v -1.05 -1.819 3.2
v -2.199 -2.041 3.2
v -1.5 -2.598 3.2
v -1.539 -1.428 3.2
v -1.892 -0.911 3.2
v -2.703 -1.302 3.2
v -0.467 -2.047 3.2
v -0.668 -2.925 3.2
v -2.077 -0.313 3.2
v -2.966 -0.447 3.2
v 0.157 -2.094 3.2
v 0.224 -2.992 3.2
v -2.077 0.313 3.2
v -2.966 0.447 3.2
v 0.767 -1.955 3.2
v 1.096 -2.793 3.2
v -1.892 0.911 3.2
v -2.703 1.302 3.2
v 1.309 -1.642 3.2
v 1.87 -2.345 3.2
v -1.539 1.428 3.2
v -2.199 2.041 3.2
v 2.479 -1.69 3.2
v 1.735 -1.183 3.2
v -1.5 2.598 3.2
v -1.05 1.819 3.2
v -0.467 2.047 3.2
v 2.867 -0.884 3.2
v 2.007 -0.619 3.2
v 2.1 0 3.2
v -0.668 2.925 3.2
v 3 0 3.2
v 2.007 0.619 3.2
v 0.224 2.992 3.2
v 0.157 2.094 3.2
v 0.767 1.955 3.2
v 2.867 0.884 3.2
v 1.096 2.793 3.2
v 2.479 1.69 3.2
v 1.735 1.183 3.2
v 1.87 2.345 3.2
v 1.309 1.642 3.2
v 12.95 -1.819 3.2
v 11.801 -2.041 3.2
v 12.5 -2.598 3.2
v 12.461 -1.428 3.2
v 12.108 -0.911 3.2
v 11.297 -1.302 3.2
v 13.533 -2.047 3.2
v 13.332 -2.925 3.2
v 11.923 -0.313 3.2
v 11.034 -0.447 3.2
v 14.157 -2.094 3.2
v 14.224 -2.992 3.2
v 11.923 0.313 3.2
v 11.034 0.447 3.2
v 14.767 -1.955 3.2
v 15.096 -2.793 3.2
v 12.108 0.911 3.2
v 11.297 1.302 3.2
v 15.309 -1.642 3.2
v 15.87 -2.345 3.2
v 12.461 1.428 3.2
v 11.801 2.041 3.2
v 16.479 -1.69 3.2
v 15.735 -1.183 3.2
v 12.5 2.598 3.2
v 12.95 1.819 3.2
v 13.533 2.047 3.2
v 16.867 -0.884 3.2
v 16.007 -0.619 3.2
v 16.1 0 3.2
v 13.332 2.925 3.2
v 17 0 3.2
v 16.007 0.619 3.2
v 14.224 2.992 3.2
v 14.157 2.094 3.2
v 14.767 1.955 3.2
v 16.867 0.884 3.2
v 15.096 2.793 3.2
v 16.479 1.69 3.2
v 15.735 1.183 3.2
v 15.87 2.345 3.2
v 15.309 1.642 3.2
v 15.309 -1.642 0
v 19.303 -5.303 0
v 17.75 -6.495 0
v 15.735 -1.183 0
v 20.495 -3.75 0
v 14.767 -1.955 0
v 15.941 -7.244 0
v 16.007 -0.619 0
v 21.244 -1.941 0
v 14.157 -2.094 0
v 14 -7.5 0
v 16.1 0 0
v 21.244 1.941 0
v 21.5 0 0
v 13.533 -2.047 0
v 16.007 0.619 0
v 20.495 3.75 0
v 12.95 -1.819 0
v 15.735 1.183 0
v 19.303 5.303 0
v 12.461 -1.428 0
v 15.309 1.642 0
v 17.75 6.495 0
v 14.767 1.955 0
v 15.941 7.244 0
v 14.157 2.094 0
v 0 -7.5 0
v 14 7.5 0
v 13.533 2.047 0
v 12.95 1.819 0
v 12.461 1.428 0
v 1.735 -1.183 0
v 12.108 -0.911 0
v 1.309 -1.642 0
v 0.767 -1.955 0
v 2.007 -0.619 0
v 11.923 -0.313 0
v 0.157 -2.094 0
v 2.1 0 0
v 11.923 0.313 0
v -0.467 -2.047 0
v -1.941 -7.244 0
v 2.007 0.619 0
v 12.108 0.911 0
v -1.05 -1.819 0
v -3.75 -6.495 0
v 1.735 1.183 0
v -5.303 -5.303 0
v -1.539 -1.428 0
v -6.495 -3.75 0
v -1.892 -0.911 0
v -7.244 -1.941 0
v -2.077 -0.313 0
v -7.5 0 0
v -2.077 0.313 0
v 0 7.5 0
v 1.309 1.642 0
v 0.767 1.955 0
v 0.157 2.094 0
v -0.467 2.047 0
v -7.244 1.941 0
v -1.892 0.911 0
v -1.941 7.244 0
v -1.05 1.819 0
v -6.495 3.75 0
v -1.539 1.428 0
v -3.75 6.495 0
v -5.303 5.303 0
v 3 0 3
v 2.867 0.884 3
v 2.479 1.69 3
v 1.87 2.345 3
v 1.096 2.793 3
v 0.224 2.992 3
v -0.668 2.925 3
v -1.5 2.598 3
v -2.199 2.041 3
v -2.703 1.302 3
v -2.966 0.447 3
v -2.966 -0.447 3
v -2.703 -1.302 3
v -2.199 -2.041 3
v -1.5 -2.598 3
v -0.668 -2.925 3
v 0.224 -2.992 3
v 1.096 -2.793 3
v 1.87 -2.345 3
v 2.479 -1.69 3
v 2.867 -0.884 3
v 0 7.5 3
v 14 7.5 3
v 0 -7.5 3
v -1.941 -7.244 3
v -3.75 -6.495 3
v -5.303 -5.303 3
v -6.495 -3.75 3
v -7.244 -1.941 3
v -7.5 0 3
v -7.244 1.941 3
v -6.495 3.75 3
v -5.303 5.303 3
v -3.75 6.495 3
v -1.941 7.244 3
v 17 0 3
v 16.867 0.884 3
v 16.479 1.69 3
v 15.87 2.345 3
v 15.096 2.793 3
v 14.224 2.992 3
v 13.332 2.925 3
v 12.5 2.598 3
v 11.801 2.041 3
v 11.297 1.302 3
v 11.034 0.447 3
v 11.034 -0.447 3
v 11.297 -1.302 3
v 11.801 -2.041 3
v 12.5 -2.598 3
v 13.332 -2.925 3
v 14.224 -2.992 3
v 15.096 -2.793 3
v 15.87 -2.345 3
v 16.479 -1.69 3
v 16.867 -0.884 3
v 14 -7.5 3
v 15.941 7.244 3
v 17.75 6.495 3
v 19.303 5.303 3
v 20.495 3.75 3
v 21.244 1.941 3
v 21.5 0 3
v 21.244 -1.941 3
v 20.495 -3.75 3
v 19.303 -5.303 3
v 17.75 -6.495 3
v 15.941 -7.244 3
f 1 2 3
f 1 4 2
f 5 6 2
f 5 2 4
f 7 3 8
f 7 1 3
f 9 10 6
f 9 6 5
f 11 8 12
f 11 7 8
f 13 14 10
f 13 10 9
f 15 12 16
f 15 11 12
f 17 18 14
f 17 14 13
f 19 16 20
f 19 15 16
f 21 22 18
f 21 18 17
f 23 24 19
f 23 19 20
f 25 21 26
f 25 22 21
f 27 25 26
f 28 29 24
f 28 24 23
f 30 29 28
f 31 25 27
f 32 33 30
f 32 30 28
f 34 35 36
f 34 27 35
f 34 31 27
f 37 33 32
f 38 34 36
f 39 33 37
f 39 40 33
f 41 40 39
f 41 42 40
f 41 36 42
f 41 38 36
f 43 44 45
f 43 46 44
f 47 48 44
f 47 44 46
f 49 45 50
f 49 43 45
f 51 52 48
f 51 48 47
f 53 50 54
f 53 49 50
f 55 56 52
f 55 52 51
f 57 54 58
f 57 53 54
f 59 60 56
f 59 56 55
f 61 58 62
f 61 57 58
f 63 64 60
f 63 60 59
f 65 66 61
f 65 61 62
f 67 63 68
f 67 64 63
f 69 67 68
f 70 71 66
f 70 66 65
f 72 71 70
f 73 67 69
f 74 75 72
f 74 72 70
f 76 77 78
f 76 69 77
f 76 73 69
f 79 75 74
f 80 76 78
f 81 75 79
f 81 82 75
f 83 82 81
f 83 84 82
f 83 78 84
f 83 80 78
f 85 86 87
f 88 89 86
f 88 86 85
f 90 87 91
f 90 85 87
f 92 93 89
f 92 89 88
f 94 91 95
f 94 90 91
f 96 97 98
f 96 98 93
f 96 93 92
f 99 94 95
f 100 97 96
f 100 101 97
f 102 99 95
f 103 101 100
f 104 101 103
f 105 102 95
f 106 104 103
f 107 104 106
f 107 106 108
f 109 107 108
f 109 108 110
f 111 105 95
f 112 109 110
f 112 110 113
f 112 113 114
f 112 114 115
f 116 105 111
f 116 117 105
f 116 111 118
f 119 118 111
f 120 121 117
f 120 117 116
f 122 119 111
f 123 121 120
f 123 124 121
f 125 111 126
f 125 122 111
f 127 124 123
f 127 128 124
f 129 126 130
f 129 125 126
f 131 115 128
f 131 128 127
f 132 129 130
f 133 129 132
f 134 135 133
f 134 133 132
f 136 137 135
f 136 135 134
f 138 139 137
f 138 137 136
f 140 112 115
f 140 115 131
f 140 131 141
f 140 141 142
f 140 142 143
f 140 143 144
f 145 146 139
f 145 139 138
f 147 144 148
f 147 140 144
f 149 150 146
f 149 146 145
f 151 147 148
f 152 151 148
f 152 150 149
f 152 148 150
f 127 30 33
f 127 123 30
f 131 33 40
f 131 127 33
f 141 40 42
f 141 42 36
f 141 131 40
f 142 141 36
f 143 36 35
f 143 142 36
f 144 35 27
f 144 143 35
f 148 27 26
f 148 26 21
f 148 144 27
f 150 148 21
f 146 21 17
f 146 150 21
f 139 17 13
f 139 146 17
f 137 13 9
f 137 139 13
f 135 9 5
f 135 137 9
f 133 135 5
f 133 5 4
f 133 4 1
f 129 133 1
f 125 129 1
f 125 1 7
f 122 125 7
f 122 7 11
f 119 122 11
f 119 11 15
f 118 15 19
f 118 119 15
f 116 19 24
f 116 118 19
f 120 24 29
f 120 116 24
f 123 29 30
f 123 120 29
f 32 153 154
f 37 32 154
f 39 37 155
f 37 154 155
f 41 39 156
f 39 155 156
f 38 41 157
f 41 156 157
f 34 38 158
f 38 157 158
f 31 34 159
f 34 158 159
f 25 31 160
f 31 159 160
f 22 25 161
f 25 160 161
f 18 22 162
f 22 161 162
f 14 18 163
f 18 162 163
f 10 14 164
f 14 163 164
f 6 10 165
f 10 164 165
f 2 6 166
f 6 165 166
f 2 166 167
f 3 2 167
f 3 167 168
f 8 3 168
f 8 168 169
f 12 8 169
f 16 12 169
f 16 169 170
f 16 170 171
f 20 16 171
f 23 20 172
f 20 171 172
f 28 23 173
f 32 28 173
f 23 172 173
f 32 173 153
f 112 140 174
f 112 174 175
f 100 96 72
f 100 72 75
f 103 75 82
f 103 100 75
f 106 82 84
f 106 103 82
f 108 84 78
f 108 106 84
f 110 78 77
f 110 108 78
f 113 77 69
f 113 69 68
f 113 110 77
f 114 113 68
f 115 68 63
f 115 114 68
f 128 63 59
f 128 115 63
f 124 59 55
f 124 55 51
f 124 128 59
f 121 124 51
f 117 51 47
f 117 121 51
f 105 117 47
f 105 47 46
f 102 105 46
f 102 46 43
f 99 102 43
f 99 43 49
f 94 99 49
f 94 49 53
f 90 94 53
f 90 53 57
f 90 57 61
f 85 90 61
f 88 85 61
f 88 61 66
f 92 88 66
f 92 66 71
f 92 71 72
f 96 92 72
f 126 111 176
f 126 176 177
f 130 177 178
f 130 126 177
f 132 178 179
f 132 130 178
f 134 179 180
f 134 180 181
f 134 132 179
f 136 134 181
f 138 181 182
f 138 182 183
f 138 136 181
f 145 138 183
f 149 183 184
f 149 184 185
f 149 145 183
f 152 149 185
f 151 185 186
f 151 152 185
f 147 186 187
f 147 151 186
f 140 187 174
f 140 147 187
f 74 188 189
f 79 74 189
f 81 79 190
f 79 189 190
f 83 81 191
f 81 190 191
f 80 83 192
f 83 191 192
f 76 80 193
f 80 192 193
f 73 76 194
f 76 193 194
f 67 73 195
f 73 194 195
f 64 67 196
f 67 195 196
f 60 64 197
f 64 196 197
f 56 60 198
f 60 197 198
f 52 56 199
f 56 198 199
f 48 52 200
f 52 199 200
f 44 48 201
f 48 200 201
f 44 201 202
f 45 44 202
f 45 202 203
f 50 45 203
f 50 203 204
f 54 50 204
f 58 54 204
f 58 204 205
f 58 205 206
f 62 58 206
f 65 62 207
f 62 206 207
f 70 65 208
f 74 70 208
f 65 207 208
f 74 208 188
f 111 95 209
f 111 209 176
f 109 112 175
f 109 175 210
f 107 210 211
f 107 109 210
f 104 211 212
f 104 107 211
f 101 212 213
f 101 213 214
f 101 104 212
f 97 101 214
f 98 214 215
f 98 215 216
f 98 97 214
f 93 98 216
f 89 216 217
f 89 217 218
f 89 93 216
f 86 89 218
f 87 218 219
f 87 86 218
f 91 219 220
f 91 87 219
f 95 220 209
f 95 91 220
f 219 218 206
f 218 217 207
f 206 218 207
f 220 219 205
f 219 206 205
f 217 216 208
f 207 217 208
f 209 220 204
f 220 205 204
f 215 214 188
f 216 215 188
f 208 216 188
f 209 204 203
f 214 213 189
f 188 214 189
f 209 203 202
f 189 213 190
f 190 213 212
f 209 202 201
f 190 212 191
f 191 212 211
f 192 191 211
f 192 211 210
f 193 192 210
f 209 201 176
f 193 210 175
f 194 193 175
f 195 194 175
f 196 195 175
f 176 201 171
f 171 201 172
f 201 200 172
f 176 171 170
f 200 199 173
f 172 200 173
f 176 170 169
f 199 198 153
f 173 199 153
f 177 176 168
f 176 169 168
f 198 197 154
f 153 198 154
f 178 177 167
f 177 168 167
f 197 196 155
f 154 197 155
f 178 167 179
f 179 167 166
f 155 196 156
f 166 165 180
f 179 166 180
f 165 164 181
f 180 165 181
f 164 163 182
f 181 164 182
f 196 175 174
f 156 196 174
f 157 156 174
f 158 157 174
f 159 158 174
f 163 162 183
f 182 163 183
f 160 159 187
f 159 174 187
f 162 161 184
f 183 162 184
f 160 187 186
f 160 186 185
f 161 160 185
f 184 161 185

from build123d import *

# Parameters (mm, degrees)
SKETCH_1_R      = 2.1
EXTRUDE_1_DEPTH = 3
SKETCH_2_R      = 3
SKETCH_2_R_2    = 2.1
EXTRUDE_2_DEPTH = 0.2


with BuildPart() as part:
    # 草图1 → 凸台-拉伸1 (new body)
    with BuildSketch(Plane.XY):
        with BuildLine():
            Line((0, 7.5), (14, 7.5))
            ThreePointArc((14, 7.5), (21.5, 0), (14, -7.5))
            Line((14, -7.5), (0, -7.5))
            ThreePointArc((0, -7.5), (-7.5, 0), (0, 7.5))
        make_face()
        Circle(SKETCH_1_R, mode=Mode.SUBTRACT)
        with Locations((14, 0)):
            Circle(SKETCH_1_R, mode=Mode.SUBTRACT)
    extrude(amount=EXTRUDE_1_DEPTH)

    # 草图2 → 凸台-拉伸2 (add)
    # profile 1 of 2: a face of its own
    with BuildSketch(Plane.XY.offset(3)):
        Circle(SKETCH_2_R)
        Circle(SKETCH_2_R_2, mode=Mode.SUBTRACT)
    # profile 2 of 2: a face of its own
    with BuildSketch(Plane.XY.offset(3)):
        with Locations((14, 0)):
            Circle(SKETCH_2_R)
        with Locations((14, 0)):
            Circle(SKETCH_2_R_2, mode=Mode.SUBTRACT)
    extrude(amount=EXTRUDE_2_DEPTH)


solid = part.part
